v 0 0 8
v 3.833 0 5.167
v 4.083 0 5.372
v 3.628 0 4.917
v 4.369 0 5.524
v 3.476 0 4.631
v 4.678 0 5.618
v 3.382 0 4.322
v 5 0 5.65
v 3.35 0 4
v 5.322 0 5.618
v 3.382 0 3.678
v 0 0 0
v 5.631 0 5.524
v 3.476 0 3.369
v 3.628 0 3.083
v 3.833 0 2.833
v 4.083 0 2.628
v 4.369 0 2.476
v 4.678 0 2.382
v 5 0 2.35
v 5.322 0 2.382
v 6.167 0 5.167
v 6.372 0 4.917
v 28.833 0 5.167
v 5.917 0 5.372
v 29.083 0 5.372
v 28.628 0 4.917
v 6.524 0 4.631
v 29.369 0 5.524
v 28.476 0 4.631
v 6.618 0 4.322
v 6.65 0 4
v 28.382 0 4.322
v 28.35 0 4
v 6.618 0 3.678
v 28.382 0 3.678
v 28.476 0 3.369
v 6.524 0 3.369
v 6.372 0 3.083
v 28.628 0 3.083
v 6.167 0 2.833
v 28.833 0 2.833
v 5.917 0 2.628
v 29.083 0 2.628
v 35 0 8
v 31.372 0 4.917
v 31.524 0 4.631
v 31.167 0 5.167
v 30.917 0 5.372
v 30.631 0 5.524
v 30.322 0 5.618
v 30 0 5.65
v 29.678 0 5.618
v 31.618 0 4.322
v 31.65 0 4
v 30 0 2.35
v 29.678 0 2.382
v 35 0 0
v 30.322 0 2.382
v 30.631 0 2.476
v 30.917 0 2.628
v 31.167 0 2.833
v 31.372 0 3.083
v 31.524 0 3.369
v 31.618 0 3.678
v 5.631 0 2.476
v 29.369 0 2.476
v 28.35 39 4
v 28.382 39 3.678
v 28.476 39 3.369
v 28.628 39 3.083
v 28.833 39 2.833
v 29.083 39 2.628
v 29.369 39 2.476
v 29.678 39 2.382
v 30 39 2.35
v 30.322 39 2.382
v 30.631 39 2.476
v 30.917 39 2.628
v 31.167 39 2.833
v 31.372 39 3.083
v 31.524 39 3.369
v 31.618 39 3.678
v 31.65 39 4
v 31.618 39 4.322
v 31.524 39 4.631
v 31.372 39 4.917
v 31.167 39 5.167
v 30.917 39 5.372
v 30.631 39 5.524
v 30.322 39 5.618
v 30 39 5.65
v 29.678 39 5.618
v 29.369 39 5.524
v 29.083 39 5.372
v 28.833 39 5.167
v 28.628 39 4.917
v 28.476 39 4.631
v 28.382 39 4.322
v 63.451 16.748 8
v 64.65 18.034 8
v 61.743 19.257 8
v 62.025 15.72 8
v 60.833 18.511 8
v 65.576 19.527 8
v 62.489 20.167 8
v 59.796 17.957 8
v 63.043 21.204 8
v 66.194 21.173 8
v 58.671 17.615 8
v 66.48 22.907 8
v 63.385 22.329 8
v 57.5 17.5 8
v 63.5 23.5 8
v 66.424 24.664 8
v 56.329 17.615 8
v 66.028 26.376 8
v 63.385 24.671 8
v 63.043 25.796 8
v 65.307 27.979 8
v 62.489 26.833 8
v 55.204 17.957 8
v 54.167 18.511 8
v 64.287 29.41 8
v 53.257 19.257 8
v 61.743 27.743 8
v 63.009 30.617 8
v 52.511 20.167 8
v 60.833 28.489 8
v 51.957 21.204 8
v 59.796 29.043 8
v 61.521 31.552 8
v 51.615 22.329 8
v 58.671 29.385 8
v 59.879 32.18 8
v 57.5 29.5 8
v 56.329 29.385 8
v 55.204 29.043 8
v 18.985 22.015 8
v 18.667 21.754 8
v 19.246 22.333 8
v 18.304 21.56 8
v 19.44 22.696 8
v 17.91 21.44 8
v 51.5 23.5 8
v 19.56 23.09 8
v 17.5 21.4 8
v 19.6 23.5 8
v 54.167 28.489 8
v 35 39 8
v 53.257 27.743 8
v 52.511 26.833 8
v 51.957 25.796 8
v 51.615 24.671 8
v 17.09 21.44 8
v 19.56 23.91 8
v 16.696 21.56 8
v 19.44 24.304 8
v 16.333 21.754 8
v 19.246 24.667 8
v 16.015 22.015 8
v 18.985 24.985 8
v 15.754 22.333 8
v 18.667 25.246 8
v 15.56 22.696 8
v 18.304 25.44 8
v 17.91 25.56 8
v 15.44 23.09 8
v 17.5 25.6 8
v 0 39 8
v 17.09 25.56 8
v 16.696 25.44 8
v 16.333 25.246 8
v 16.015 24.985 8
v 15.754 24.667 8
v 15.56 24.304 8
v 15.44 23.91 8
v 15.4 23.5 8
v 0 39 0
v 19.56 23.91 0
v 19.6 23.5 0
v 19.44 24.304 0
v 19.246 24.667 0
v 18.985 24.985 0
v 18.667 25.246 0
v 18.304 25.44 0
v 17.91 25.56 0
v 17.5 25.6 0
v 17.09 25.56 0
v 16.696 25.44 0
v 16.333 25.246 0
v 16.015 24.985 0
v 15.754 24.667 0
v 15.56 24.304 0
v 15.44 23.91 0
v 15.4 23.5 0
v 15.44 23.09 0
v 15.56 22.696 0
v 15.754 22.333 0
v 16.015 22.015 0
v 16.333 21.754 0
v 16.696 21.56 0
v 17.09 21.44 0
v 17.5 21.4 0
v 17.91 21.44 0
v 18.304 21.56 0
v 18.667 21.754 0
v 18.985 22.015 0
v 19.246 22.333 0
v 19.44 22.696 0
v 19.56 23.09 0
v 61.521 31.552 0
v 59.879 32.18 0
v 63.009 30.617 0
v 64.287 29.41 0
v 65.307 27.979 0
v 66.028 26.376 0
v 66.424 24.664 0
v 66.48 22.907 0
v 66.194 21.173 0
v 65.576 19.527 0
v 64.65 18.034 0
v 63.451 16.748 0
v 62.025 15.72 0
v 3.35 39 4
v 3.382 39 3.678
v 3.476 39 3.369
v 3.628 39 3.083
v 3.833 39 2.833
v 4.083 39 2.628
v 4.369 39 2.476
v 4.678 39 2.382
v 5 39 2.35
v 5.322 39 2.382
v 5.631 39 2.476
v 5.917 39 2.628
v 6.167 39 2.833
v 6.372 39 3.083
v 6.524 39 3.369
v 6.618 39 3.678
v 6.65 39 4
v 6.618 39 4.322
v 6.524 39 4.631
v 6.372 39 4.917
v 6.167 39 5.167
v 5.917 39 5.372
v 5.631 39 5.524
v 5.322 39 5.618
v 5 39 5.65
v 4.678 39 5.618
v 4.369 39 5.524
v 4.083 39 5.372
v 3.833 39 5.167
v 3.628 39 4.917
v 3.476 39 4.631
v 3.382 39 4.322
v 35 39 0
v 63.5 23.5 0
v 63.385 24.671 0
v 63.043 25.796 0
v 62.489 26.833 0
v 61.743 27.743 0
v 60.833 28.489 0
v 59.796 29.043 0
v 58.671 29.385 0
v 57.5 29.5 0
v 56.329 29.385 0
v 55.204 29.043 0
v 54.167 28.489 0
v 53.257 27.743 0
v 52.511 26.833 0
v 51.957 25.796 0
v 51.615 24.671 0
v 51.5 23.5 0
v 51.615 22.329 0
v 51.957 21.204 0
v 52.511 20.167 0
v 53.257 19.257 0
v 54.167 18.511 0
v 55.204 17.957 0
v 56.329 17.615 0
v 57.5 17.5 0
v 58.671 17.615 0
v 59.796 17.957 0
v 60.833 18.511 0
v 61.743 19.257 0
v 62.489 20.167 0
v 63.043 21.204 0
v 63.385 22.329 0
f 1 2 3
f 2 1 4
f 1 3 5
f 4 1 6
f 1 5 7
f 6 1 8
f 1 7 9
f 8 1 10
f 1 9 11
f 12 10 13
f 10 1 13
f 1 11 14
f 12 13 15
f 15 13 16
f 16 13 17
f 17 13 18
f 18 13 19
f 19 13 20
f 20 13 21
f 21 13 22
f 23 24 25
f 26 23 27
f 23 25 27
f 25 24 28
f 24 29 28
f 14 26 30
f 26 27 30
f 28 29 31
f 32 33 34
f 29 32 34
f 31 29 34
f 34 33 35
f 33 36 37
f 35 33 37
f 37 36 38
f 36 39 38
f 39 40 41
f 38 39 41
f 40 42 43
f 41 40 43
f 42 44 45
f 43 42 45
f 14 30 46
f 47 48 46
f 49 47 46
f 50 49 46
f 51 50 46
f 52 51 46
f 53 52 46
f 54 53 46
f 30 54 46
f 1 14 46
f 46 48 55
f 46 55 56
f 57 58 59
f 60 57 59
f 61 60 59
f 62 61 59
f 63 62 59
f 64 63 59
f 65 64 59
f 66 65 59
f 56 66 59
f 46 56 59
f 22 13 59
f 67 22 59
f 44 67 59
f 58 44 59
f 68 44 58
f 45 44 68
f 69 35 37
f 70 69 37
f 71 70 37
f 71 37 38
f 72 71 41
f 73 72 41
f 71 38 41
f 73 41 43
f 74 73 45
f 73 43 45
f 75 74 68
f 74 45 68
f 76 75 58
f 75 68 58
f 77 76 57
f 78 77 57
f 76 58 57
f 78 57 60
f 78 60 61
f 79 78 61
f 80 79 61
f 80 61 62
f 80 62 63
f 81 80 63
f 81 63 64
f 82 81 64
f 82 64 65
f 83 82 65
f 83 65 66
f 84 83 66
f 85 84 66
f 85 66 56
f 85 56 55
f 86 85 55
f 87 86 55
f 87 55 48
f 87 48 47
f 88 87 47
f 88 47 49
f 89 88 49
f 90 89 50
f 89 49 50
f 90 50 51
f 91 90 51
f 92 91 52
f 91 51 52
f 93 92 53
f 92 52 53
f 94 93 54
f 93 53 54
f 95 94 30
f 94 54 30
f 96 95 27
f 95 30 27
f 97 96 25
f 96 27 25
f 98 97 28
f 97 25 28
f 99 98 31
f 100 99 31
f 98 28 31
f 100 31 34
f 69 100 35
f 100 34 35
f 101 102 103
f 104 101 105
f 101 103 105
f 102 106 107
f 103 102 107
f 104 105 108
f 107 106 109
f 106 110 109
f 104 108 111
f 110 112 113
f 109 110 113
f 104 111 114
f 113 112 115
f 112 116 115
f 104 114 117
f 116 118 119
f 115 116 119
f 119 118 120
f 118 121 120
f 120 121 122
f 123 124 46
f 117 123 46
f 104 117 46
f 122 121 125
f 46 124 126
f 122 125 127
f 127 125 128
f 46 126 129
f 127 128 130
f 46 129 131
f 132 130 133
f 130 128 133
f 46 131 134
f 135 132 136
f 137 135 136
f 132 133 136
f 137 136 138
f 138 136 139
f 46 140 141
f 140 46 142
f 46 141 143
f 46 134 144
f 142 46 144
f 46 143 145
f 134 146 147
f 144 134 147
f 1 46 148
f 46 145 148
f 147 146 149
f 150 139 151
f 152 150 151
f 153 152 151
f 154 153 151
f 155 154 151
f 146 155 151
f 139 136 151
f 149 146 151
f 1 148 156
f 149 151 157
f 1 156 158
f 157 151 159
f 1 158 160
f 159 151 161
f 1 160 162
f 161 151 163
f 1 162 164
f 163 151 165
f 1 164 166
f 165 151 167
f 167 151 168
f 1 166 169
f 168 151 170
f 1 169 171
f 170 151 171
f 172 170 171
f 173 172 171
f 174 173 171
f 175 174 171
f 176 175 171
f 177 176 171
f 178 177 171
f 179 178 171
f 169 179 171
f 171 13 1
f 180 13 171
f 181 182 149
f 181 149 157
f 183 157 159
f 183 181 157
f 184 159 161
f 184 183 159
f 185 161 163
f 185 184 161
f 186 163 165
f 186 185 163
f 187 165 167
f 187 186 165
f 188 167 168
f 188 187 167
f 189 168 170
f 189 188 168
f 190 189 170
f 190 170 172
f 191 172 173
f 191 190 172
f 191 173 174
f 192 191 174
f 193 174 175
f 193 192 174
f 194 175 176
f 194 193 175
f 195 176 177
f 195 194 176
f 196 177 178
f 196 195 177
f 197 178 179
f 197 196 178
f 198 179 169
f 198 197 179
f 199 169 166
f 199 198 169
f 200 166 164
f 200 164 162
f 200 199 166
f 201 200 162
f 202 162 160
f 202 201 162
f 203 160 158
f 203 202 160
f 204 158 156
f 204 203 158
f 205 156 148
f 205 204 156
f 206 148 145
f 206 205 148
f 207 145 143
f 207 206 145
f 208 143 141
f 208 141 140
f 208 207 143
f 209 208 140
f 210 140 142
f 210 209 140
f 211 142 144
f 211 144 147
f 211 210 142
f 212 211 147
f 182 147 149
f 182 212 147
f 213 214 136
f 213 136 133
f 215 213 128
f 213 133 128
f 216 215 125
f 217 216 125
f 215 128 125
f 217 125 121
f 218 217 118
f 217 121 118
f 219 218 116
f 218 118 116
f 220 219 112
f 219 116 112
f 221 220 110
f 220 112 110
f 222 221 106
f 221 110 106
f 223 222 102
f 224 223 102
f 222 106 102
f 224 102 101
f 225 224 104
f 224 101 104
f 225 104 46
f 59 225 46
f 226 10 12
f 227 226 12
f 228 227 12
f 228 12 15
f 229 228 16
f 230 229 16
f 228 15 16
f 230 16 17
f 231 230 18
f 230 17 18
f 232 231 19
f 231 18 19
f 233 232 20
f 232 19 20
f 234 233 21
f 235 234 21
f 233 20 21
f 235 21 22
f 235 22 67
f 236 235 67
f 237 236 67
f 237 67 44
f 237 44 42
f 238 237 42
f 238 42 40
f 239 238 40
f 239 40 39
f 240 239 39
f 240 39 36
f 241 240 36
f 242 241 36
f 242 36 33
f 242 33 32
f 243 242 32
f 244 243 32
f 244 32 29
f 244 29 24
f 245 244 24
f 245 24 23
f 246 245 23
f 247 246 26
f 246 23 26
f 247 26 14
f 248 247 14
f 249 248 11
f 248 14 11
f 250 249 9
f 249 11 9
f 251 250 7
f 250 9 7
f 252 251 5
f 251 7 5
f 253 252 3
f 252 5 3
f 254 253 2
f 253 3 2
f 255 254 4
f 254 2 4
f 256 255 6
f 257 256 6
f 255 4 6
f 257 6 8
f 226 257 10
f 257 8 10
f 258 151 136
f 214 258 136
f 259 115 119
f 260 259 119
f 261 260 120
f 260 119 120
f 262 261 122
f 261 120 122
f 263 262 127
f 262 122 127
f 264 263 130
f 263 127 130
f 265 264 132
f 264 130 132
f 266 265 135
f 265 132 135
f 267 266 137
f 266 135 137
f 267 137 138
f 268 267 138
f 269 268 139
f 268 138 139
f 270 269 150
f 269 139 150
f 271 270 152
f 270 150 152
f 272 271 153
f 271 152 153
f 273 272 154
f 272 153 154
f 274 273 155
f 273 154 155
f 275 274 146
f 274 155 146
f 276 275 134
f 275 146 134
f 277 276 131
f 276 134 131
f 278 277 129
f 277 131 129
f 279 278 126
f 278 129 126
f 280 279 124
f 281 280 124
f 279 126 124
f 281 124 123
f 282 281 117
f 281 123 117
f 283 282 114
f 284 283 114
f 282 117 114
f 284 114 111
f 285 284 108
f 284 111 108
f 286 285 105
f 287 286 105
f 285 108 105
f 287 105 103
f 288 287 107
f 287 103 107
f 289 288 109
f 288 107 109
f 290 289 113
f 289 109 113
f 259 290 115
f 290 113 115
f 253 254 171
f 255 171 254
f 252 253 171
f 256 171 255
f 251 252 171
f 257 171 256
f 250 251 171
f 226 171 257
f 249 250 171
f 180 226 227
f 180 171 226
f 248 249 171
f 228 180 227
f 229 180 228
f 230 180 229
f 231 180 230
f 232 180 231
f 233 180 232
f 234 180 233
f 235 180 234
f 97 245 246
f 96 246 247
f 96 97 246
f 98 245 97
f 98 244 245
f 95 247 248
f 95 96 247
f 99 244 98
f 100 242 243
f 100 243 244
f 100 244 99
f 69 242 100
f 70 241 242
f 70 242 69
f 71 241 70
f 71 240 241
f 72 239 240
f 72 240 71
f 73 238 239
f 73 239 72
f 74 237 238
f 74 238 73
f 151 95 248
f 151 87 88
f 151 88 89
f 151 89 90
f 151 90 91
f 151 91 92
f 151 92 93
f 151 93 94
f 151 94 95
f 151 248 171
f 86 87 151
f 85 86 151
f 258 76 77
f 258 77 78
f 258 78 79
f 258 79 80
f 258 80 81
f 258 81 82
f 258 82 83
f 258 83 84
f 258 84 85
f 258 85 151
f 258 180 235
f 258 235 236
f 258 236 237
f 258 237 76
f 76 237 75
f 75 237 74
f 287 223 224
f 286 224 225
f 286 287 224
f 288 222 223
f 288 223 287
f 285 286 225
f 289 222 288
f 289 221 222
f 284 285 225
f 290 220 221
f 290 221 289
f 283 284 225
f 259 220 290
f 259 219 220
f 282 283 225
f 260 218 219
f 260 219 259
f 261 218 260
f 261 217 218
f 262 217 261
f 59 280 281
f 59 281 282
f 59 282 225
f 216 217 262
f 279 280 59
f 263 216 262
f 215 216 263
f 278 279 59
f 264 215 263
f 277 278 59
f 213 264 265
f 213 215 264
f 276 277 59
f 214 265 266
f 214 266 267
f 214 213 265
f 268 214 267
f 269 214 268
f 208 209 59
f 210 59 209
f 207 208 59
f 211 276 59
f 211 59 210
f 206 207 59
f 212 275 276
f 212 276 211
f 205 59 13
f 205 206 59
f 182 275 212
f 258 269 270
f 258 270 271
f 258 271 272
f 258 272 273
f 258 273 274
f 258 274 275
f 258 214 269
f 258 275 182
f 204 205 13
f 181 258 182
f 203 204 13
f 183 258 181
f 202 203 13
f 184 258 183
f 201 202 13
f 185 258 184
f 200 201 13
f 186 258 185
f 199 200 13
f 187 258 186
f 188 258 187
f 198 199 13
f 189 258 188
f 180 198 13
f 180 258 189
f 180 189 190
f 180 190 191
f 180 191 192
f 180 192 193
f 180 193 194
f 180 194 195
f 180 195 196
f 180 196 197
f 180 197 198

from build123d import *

# Parameters (mm, degrees)
SKETCH_1_W          = 35
SKETCH_1_H          = 39
SKETCH_1_R          = 2.1
EXTRUDE_1_DEPTH     = 8
SKETCH_2_R          = 1.6
CUT_EXTRUDE_1_DEPTH = 54.009433123
SKETCH_5_R          = 6
EXTRUDE_3_DEPTH     = 8
M4X0_7_1_D          = 3.3


with BuildPart() as part:
    # 草图1 → 凸台-拉伸1 (new body)
    with BuildSketch(Plane.XY):
        with Locations((17.5, 19.5)):
            Rectangle(SKETCH_1_W, SKETCH_1_H)
        with Locations((17.5, 23.5)):
            Circle(SKETCH_1_R, mode=Mode.SUBTRACT)
    extrude(amount=EXTRUDE_1_DEPTH)

    # 草图2 → 切除-拉伸1 (cut, through all)
    with BuildSketch(Plane(origin=(0, 39, 0), x_dir=(1, 0, 0), z_dir=(0, 1, 0))):
        with Locations(Location((5, -4, 0), (0, 0, 270))):
            Circle(SKETCH_2_R)
        with Locations(Location((30, -4, 0), (0, 0, 270))):
            Circle(SKETCH_2_R)
    extrude(amount=-CUT_EXTRUDE_1_DEPTH, mode=Mode.SUBTRACT)

    # 草图5 → 凸台-拉伸3 (add)
    with BuildSketch(Plane.XY.offset(8)):
        with BuildLine():
            Line((35, 39), (59.879399185, 32.179773011))
            ThreePointArc((59.879399185, 32.179773011), (66.424469933, 24.663544764), (62.025315767, 15.720442351))
            Line((62.025315767, 15.720442351), (35, 0))
            Line((35, 0), (35, 39))
        make_face()
        with Locations((57.5, 23.5)):
            Circle(SKETCH_5_R, mode=Mode.SUBTRACT)
    extrude(amount=-EXTRUDE_3_DEPTH)

    # M4x0.7 螺纹孔1 (through all)
    with Locations(Plane(origin=(0, 39, 0), x_dir=(1, 0, 0), z_dir=(0, 1, 0))):
        with Locations((5, -4), (30, -4)):
            Hole(M4X0_7_1_D / 2)


solid = part.part
